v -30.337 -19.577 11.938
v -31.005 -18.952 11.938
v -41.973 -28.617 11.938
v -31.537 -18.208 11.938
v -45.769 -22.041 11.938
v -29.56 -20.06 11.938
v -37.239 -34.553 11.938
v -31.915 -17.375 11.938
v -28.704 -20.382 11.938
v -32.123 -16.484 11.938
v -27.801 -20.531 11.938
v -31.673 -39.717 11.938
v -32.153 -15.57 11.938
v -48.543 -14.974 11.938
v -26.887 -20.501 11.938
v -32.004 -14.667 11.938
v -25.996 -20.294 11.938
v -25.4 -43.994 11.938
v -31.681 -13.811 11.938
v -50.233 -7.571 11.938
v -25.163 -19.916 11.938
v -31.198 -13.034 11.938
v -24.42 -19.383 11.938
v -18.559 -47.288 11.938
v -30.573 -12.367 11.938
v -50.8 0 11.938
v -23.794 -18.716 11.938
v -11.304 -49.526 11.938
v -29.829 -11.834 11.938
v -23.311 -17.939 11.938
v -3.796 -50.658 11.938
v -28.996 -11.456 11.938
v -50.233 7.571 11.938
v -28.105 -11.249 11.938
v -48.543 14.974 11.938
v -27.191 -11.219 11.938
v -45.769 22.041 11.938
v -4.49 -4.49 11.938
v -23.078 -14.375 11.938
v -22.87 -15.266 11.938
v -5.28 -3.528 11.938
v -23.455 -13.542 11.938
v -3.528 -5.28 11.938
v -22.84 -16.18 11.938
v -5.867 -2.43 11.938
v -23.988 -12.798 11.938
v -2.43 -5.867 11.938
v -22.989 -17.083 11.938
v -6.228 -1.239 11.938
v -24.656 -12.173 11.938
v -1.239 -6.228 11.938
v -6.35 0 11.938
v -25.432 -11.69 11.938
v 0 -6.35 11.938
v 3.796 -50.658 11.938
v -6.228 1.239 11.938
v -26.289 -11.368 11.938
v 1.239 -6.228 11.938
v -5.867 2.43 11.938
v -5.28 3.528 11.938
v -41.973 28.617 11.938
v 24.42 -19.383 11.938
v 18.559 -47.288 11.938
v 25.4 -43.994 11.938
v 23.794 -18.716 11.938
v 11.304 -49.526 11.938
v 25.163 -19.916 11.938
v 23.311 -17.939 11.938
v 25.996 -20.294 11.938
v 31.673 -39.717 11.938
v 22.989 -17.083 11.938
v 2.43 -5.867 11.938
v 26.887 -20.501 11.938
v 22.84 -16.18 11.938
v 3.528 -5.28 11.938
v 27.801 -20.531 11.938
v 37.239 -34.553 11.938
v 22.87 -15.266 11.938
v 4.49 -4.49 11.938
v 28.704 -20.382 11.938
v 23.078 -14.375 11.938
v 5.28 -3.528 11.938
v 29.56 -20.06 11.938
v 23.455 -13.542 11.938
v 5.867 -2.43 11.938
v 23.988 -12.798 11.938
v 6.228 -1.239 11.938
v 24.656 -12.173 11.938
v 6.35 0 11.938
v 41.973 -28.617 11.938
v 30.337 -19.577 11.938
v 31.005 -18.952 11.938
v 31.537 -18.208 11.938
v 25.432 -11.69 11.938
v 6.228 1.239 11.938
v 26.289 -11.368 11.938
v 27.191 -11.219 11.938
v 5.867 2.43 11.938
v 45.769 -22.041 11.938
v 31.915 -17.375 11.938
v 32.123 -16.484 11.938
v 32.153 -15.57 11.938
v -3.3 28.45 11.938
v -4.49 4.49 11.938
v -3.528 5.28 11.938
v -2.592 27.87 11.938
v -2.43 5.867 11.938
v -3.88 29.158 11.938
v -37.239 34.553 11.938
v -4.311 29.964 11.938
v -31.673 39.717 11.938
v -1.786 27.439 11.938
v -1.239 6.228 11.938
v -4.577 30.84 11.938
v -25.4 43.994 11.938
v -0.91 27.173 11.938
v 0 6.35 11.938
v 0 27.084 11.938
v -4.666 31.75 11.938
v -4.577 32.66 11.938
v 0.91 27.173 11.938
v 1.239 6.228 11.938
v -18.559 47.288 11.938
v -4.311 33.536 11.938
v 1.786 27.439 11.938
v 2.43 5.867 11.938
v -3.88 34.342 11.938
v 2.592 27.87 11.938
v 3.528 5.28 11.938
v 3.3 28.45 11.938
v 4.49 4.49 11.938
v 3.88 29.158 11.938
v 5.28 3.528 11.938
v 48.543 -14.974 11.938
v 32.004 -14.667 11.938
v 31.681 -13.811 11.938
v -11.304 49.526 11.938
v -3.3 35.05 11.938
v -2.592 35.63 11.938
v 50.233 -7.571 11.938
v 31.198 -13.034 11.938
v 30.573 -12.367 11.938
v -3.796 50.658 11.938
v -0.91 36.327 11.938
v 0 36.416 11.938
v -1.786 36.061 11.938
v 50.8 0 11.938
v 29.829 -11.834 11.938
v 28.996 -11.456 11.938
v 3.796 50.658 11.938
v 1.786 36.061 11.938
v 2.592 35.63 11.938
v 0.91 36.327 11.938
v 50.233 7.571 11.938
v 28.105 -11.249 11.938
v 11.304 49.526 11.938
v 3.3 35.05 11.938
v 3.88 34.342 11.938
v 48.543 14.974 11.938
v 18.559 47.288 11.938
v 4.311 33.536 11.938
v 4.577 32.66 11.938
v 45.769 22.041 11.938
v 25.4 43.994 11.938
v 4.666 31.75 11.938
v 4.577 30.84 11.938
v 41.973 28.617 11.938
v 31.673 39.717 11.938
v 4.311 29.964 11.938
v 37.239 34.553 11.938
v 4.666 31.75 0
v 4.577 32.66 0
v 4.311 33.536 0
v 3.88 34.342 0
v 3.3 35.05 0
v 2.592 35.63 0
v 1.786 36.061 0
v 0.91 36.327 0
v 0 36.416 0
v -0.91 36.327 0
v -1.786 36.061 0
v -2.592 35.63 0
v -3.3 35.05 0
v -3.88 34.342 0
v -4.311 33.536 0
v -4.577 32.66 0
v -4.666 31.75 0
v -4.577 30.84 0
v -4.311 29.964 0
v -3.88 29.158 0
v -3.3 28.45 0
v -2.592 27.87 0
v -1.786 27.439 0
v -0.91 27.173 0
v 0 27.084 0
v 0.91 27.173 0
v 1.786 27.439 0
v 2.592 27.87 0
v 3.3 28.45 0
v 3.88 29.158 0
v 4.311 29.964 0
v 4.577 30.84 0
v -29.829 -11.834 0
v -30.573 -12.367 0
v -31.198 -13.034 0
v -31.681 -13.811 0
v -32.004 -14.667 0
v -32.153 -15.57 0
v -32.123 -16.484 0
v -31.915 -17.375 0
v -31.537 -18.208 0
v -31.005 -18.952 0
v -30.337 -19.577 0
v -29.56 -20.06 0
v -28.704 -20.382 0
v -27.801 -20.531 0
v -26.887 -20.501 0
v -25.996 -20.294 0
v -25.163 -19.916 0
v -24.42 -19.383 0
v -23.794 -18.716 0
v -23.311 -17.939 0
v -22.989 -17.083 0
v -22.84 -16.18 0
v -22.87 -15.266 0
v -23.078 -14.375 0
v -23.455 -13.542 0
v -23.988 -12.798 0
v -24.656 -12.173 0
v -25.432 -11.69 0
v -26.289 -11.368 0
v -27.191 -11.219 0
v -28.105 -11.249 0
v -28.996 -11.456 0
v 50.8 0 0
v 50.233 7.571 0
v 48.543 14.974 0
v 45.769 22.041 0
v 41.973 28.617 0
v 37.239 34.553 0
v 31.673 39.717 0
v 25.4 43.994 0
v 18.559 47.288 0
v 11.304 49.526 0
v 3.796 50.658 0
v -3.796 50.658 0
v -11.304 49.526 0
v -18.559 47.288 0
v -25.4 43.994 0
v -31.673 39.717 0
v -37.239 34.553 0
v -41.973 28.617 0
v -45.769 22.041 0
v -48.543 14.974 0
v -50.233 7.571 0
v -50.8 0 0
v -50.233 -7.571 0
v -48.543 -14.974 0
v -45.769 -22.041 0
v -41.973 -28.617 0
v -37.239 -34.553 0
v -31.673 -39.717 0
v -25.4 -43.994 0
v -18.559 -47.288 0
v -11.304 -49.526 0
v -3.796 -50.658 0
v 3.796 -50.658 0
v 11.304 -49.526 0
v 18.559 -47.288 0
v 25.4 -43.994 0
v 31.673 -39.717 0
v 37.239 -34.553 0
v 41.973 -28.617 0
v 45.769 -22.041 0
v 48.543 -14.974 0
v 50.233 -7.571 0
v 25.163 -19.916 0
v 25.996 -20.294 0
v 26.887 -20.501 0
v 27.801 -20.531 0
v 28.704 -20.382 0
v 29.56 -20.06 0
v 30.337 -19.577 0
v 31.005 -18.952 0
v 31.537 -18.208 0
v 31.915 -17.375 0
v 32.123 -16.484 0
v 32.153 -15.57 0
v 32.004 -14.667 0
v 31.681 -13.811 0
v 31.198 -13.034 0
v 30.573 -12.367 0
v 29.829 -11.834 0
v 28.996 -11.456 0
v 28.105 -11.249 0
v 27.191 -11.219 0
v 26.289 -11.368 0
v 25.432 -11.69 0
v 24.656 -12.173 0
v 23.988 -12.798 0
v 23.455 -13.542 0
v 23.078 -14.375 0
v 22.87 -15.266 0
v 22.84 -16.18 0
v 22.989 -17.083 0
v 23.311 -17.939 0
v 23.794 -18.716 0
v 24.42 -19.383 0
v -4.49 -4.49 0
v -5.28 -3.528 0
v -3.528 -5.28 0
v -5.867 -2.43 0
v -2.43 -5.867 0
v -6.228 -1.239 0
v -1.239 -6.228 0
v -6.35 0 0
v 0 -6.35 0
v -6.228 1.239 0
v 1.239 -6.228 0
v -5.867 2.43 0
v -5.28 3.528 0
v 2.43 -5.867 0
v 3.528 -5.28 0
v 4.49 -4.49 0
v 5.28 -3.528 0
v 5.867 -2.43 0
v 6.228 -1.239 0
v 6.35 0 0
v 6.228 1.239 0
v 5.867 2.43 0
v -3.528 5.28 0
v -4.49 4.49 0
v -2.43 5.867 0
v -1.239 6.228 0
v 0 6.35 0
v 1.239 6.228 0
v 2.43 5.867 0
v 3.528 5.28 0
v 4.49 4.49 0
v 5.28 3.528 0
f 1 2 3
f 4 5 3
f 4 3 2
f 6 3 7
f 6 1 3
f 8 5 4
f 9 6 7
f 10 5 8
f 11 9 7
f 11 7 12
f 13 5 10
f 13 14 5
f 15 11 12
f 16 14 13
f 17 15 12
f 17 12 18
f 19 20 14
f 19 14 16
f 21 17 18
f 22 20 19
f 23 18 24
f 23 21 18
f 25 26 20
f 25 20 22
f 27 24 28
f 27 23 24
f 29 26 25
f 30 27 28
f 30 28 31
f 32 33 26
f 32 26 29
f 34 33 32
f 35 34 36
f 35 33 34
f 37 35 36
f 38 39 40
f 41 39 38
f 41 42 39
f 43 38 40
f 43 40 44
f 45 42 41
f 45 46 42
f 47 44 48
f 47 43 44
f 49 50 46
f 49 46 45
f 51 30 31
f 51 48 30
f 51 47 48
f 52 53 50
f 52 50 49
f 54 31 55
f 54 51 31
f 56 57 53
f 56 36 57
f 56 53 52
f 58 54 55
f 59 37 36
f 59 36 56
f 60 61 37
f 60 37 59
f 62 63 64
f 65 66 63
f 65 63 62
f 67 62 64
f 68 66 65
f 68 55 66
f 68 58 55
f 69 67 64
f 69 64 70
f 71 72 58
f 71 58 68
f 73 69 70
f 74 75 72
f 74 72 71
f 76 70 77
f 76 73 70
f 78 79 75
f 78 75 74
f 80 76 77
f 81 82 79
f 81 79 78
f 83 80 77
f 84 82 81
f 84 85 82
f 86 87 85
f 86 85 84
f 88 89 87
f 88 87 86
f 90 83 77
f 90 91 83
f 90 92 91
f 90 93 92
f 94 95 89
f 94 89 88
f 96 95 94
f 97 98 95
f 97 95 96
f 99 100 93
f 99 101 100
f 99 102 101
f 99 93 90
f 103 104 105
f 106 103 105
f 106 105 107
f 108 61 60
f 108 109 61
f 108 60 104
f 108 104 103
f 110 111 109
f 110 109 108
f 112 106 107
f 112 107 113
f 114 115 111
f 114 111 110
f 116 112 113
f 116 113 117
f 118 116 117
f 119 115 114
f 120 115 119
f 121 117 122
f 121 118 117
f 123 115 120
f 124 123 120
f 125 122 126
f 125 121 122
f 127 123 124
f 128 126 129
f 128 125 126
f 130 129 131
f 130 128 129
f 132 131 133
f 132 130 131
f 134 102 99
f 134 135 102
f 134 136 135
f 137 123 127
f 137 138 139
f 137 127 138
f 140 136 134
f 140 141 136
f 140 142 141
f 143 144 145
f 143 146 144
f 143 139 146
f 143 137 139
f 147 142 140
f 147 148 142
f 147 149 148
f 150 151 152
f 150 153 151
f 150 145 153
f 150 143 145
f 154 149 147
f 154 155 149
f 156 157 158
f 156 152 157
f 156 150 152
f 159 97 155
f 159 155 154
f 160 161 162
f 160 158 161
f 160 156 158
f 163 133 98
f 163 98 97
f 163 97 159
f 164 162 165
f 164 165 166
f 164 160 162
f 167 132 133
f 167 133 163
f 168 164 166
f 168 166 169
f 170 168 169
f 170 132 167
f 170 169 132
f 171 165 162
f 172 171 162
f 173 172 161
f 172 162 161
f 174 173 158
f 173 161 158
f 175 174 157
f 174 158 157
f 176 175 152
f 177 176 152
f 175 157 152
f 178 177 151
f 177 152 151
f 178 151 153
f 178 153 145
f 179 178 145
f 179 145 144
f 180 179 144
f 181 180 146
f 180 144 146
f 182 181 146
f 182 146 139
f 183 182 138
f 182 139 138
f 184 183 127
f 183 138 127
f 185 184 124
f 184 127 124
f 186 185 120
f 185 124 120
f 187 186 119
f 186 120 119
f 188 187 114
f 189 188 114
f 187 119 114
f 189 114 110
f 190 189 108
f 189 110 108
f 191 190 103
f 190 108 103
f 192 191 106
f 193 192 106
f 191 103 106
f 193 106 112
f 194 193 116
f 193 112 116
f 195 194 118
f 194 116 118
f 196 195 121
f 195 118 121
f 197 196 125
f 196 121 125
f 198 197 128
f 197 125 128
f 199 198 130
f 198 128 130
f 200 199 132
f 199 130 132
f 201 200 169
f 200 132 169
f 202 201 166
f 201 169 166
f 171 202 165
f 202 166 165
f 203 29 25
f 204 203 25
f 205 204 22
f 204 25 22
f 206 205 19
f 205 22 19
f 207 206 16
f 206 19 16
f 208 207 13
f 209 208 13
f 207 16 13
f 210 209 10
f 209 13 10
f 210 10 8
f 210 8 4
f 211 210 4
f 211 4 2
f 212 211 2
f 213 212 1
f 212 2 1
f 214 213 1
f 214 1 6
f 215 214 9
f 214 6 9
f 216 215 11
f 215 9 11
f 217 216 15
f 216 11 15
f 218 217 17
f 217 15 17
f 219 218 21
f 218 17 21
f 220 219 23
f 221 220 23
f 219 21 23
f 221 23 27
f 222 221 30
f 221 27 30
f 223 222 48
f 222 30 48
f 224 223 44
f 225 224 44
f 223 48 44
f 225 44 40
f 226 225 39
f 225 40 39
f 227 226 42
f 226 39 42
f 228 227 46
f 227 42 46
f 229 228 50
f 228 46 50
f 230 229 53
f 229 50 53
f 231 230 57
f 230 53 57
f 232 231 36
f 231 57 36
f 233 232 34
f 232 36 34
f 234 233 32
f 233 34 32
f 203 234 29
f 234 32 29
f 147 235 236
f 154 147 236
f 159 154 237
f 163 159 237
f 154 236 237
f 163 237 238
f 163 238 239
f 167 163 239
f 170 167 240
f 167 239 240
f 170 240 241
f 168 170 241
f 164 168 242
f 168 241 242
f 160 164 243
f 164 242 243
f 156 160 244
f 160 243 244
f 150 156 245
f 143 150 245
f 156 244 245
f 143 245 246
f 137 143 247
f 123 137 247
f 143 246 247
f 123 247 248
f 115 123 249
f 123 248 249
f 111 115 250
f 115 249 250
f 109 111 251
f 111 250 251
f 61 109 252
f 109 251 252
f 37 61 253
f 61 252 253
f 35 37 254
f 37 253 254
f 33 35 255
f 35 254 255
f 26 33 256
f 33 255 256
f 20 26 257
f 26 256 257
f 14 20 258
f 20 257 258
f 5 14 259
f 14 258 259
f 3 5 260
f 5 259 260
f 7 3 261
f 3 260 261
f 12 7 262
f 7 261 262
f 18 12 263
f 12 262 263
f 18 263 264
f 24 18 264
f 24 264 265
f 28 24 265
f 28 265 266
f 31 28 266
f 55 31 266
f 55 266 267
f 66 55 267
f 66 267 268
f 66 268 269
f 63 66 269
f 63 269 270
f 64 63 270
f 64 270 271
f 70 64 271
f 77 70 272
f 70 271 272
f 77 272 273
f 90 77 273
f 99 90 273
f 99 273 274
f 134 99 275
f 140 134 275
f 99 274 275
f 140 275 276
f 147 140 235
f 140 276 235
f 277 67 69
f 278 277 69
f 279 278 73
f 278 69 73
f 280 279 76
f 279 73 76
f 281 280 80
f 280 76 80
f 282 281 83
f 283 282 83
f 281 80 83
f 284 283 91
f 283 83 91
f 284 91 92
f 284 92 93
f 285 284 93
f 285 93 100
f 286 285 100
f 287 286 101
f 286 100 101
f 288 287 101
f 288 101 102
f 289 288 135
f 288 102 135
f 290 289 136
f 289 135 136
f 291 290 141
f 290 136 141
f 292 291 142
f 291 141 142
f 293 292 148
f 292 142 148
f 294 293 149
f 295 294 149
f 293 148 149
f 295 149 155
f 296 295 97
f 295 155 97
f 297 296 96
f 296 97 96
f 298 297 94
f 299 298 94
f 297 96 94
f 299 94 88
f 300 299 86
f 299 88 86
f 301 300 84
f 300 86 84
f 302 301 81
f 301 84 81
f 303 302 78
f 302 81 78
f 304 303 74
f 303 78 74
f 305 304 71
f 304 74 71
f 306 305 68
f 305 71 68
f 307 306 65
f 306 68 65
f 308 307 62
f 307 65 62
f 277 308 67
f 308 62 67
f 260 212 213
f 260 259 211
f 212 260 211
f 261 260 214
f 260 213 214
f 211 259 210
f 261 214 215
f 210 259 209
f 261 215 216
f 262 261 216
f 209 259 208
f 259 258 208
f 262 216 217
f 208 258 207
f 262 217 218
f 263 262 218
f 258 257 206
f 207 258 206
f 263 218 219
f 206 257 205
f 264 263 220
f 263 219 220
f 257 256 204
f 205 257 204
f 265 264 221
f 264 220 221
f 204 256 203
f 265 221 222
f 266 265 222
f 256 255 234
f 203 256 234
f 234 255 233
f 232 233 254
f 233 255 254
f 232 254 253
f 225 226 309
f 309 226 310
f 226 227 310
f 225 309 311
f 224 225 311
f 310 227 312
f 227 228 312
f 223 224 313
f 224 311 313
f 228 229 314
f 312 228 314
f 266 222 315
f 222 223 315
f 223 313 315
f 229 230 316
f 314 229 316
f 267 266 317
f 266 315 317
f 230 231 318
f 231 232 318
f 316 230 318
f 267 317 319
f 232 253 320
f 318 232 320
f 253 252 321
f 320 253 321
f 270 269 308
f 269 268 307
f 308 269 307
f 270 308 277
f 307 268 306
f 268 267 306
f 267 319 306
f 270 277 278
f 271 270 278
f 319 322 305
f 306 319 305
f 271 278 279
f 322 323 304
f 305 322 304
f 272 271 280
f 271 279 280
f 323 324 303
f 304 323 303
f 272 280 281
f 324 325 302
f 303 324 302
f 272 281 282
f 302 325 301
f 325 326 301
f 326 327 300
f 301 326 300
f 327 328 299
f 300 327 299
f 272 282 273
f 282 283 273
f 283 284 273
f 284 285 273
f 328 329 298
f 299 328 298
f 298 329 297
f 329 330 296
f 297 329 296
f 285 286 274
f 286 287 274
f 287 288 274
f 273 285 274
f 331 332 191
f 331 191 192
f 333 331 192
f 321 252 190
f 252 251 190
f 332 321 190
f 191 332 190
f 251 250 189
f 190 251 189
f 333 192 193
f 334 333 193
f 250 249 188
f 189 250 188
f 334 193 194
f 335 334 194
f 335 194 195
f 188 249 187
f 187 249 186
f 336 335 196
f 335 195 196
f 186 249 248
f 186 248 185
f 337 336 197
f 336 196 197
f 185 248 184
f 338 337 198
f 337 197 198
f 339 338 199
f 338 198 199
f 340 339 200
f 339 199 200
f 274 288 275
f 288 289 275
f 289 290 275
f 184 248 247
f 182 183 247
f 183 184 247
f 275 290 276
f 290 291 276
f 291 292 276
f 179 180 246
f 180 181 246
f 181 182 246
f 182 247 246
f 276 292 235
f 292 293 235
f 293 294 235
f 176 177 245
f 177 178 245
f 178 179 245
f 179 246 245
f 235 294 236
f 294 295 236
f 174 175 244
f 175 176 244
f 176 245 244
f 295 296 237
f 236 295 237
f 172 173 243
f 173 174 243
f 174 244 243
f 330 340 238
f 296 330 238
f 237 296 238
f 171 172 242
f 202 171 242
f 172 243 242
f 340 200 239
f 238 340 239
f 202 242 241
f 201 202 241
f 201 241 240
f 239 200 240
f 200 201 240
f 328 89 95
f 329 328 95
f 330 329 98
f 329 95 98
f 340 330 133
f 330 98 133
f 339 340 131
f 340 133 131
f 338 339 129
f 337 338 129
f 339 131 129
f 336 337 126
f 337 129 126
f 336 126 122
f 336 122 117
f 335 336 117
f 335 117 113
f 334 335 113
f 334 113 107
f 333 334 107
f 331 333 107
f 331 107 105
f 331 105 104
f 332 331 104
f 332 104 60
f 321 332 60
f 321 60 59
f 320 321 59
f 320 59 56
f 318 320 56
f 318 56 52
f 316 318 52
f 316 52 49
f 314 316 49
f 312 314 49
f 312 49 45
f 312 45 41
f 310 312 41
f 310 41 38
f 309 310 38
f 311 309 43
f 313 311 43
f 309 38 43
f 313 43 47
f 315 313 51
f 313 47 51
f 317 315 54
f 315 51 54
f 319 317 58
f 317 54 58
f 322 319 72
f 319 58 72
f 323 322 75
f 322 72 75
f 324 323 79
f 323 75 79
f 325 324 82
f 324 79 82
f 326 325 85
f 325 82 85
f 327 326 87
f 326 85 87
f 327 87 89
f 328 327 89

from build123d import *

# Parameters (mm, degrees)
SKETCH1_R               = 50.8
TOP_PLATE_DEPTH         = 11.938
SKETCH2_R               = 6.35
CENTRAL_HOLE_DEPTH      = 73.82716419
SKETCH3_R               = 4.66627796
BALL_HOLE_DEPTH         = 11.938
BALL_HOLE_PATTERN_COUNT = 3


with BuildPart() as part:
    # Sketch1 → top_plate (new body)
    with BuildSketch(Plane.XY):
        Circle(SKETCH1_R)
    extrude(amount=TOP_PLATE_DEPTH)

    # Sketch2 → central_hole (cut, through all)
    with BuildSketch(Plane.XY.offset(11.938)):
        Circle(SKETCH2_R)
    extrude(amount=-CENTRAL_HOLE_DEPTH, mode=Mode.SUBTRACT)

    # Sketch3 → ball_hole (cut)
    with BuildSketch(Plane.XY.offset(11.938)):
        with Locations((0, 31.75)):
            Circle(SKETCH3_R)
    ball_hole = extrude(amount=-BALL_HOLE_DEPTH, mode=Mode.SUBTRACT)

    # ball_hole_pattern: ball_hole ×3 about axis
    ball_hole_pattern_axis = Axis((0, 0, 0), (0, 0, 1))
    for i in range(1, BALL_HOLE_PATTERN_COUNT):
        add(ball_hole.rotate(ball_hole_pattern_axis, i * 360 / BALL_HOLE_PATTERN_COUNT), mode=Mode.SUBTRACT)


solid = part.part
